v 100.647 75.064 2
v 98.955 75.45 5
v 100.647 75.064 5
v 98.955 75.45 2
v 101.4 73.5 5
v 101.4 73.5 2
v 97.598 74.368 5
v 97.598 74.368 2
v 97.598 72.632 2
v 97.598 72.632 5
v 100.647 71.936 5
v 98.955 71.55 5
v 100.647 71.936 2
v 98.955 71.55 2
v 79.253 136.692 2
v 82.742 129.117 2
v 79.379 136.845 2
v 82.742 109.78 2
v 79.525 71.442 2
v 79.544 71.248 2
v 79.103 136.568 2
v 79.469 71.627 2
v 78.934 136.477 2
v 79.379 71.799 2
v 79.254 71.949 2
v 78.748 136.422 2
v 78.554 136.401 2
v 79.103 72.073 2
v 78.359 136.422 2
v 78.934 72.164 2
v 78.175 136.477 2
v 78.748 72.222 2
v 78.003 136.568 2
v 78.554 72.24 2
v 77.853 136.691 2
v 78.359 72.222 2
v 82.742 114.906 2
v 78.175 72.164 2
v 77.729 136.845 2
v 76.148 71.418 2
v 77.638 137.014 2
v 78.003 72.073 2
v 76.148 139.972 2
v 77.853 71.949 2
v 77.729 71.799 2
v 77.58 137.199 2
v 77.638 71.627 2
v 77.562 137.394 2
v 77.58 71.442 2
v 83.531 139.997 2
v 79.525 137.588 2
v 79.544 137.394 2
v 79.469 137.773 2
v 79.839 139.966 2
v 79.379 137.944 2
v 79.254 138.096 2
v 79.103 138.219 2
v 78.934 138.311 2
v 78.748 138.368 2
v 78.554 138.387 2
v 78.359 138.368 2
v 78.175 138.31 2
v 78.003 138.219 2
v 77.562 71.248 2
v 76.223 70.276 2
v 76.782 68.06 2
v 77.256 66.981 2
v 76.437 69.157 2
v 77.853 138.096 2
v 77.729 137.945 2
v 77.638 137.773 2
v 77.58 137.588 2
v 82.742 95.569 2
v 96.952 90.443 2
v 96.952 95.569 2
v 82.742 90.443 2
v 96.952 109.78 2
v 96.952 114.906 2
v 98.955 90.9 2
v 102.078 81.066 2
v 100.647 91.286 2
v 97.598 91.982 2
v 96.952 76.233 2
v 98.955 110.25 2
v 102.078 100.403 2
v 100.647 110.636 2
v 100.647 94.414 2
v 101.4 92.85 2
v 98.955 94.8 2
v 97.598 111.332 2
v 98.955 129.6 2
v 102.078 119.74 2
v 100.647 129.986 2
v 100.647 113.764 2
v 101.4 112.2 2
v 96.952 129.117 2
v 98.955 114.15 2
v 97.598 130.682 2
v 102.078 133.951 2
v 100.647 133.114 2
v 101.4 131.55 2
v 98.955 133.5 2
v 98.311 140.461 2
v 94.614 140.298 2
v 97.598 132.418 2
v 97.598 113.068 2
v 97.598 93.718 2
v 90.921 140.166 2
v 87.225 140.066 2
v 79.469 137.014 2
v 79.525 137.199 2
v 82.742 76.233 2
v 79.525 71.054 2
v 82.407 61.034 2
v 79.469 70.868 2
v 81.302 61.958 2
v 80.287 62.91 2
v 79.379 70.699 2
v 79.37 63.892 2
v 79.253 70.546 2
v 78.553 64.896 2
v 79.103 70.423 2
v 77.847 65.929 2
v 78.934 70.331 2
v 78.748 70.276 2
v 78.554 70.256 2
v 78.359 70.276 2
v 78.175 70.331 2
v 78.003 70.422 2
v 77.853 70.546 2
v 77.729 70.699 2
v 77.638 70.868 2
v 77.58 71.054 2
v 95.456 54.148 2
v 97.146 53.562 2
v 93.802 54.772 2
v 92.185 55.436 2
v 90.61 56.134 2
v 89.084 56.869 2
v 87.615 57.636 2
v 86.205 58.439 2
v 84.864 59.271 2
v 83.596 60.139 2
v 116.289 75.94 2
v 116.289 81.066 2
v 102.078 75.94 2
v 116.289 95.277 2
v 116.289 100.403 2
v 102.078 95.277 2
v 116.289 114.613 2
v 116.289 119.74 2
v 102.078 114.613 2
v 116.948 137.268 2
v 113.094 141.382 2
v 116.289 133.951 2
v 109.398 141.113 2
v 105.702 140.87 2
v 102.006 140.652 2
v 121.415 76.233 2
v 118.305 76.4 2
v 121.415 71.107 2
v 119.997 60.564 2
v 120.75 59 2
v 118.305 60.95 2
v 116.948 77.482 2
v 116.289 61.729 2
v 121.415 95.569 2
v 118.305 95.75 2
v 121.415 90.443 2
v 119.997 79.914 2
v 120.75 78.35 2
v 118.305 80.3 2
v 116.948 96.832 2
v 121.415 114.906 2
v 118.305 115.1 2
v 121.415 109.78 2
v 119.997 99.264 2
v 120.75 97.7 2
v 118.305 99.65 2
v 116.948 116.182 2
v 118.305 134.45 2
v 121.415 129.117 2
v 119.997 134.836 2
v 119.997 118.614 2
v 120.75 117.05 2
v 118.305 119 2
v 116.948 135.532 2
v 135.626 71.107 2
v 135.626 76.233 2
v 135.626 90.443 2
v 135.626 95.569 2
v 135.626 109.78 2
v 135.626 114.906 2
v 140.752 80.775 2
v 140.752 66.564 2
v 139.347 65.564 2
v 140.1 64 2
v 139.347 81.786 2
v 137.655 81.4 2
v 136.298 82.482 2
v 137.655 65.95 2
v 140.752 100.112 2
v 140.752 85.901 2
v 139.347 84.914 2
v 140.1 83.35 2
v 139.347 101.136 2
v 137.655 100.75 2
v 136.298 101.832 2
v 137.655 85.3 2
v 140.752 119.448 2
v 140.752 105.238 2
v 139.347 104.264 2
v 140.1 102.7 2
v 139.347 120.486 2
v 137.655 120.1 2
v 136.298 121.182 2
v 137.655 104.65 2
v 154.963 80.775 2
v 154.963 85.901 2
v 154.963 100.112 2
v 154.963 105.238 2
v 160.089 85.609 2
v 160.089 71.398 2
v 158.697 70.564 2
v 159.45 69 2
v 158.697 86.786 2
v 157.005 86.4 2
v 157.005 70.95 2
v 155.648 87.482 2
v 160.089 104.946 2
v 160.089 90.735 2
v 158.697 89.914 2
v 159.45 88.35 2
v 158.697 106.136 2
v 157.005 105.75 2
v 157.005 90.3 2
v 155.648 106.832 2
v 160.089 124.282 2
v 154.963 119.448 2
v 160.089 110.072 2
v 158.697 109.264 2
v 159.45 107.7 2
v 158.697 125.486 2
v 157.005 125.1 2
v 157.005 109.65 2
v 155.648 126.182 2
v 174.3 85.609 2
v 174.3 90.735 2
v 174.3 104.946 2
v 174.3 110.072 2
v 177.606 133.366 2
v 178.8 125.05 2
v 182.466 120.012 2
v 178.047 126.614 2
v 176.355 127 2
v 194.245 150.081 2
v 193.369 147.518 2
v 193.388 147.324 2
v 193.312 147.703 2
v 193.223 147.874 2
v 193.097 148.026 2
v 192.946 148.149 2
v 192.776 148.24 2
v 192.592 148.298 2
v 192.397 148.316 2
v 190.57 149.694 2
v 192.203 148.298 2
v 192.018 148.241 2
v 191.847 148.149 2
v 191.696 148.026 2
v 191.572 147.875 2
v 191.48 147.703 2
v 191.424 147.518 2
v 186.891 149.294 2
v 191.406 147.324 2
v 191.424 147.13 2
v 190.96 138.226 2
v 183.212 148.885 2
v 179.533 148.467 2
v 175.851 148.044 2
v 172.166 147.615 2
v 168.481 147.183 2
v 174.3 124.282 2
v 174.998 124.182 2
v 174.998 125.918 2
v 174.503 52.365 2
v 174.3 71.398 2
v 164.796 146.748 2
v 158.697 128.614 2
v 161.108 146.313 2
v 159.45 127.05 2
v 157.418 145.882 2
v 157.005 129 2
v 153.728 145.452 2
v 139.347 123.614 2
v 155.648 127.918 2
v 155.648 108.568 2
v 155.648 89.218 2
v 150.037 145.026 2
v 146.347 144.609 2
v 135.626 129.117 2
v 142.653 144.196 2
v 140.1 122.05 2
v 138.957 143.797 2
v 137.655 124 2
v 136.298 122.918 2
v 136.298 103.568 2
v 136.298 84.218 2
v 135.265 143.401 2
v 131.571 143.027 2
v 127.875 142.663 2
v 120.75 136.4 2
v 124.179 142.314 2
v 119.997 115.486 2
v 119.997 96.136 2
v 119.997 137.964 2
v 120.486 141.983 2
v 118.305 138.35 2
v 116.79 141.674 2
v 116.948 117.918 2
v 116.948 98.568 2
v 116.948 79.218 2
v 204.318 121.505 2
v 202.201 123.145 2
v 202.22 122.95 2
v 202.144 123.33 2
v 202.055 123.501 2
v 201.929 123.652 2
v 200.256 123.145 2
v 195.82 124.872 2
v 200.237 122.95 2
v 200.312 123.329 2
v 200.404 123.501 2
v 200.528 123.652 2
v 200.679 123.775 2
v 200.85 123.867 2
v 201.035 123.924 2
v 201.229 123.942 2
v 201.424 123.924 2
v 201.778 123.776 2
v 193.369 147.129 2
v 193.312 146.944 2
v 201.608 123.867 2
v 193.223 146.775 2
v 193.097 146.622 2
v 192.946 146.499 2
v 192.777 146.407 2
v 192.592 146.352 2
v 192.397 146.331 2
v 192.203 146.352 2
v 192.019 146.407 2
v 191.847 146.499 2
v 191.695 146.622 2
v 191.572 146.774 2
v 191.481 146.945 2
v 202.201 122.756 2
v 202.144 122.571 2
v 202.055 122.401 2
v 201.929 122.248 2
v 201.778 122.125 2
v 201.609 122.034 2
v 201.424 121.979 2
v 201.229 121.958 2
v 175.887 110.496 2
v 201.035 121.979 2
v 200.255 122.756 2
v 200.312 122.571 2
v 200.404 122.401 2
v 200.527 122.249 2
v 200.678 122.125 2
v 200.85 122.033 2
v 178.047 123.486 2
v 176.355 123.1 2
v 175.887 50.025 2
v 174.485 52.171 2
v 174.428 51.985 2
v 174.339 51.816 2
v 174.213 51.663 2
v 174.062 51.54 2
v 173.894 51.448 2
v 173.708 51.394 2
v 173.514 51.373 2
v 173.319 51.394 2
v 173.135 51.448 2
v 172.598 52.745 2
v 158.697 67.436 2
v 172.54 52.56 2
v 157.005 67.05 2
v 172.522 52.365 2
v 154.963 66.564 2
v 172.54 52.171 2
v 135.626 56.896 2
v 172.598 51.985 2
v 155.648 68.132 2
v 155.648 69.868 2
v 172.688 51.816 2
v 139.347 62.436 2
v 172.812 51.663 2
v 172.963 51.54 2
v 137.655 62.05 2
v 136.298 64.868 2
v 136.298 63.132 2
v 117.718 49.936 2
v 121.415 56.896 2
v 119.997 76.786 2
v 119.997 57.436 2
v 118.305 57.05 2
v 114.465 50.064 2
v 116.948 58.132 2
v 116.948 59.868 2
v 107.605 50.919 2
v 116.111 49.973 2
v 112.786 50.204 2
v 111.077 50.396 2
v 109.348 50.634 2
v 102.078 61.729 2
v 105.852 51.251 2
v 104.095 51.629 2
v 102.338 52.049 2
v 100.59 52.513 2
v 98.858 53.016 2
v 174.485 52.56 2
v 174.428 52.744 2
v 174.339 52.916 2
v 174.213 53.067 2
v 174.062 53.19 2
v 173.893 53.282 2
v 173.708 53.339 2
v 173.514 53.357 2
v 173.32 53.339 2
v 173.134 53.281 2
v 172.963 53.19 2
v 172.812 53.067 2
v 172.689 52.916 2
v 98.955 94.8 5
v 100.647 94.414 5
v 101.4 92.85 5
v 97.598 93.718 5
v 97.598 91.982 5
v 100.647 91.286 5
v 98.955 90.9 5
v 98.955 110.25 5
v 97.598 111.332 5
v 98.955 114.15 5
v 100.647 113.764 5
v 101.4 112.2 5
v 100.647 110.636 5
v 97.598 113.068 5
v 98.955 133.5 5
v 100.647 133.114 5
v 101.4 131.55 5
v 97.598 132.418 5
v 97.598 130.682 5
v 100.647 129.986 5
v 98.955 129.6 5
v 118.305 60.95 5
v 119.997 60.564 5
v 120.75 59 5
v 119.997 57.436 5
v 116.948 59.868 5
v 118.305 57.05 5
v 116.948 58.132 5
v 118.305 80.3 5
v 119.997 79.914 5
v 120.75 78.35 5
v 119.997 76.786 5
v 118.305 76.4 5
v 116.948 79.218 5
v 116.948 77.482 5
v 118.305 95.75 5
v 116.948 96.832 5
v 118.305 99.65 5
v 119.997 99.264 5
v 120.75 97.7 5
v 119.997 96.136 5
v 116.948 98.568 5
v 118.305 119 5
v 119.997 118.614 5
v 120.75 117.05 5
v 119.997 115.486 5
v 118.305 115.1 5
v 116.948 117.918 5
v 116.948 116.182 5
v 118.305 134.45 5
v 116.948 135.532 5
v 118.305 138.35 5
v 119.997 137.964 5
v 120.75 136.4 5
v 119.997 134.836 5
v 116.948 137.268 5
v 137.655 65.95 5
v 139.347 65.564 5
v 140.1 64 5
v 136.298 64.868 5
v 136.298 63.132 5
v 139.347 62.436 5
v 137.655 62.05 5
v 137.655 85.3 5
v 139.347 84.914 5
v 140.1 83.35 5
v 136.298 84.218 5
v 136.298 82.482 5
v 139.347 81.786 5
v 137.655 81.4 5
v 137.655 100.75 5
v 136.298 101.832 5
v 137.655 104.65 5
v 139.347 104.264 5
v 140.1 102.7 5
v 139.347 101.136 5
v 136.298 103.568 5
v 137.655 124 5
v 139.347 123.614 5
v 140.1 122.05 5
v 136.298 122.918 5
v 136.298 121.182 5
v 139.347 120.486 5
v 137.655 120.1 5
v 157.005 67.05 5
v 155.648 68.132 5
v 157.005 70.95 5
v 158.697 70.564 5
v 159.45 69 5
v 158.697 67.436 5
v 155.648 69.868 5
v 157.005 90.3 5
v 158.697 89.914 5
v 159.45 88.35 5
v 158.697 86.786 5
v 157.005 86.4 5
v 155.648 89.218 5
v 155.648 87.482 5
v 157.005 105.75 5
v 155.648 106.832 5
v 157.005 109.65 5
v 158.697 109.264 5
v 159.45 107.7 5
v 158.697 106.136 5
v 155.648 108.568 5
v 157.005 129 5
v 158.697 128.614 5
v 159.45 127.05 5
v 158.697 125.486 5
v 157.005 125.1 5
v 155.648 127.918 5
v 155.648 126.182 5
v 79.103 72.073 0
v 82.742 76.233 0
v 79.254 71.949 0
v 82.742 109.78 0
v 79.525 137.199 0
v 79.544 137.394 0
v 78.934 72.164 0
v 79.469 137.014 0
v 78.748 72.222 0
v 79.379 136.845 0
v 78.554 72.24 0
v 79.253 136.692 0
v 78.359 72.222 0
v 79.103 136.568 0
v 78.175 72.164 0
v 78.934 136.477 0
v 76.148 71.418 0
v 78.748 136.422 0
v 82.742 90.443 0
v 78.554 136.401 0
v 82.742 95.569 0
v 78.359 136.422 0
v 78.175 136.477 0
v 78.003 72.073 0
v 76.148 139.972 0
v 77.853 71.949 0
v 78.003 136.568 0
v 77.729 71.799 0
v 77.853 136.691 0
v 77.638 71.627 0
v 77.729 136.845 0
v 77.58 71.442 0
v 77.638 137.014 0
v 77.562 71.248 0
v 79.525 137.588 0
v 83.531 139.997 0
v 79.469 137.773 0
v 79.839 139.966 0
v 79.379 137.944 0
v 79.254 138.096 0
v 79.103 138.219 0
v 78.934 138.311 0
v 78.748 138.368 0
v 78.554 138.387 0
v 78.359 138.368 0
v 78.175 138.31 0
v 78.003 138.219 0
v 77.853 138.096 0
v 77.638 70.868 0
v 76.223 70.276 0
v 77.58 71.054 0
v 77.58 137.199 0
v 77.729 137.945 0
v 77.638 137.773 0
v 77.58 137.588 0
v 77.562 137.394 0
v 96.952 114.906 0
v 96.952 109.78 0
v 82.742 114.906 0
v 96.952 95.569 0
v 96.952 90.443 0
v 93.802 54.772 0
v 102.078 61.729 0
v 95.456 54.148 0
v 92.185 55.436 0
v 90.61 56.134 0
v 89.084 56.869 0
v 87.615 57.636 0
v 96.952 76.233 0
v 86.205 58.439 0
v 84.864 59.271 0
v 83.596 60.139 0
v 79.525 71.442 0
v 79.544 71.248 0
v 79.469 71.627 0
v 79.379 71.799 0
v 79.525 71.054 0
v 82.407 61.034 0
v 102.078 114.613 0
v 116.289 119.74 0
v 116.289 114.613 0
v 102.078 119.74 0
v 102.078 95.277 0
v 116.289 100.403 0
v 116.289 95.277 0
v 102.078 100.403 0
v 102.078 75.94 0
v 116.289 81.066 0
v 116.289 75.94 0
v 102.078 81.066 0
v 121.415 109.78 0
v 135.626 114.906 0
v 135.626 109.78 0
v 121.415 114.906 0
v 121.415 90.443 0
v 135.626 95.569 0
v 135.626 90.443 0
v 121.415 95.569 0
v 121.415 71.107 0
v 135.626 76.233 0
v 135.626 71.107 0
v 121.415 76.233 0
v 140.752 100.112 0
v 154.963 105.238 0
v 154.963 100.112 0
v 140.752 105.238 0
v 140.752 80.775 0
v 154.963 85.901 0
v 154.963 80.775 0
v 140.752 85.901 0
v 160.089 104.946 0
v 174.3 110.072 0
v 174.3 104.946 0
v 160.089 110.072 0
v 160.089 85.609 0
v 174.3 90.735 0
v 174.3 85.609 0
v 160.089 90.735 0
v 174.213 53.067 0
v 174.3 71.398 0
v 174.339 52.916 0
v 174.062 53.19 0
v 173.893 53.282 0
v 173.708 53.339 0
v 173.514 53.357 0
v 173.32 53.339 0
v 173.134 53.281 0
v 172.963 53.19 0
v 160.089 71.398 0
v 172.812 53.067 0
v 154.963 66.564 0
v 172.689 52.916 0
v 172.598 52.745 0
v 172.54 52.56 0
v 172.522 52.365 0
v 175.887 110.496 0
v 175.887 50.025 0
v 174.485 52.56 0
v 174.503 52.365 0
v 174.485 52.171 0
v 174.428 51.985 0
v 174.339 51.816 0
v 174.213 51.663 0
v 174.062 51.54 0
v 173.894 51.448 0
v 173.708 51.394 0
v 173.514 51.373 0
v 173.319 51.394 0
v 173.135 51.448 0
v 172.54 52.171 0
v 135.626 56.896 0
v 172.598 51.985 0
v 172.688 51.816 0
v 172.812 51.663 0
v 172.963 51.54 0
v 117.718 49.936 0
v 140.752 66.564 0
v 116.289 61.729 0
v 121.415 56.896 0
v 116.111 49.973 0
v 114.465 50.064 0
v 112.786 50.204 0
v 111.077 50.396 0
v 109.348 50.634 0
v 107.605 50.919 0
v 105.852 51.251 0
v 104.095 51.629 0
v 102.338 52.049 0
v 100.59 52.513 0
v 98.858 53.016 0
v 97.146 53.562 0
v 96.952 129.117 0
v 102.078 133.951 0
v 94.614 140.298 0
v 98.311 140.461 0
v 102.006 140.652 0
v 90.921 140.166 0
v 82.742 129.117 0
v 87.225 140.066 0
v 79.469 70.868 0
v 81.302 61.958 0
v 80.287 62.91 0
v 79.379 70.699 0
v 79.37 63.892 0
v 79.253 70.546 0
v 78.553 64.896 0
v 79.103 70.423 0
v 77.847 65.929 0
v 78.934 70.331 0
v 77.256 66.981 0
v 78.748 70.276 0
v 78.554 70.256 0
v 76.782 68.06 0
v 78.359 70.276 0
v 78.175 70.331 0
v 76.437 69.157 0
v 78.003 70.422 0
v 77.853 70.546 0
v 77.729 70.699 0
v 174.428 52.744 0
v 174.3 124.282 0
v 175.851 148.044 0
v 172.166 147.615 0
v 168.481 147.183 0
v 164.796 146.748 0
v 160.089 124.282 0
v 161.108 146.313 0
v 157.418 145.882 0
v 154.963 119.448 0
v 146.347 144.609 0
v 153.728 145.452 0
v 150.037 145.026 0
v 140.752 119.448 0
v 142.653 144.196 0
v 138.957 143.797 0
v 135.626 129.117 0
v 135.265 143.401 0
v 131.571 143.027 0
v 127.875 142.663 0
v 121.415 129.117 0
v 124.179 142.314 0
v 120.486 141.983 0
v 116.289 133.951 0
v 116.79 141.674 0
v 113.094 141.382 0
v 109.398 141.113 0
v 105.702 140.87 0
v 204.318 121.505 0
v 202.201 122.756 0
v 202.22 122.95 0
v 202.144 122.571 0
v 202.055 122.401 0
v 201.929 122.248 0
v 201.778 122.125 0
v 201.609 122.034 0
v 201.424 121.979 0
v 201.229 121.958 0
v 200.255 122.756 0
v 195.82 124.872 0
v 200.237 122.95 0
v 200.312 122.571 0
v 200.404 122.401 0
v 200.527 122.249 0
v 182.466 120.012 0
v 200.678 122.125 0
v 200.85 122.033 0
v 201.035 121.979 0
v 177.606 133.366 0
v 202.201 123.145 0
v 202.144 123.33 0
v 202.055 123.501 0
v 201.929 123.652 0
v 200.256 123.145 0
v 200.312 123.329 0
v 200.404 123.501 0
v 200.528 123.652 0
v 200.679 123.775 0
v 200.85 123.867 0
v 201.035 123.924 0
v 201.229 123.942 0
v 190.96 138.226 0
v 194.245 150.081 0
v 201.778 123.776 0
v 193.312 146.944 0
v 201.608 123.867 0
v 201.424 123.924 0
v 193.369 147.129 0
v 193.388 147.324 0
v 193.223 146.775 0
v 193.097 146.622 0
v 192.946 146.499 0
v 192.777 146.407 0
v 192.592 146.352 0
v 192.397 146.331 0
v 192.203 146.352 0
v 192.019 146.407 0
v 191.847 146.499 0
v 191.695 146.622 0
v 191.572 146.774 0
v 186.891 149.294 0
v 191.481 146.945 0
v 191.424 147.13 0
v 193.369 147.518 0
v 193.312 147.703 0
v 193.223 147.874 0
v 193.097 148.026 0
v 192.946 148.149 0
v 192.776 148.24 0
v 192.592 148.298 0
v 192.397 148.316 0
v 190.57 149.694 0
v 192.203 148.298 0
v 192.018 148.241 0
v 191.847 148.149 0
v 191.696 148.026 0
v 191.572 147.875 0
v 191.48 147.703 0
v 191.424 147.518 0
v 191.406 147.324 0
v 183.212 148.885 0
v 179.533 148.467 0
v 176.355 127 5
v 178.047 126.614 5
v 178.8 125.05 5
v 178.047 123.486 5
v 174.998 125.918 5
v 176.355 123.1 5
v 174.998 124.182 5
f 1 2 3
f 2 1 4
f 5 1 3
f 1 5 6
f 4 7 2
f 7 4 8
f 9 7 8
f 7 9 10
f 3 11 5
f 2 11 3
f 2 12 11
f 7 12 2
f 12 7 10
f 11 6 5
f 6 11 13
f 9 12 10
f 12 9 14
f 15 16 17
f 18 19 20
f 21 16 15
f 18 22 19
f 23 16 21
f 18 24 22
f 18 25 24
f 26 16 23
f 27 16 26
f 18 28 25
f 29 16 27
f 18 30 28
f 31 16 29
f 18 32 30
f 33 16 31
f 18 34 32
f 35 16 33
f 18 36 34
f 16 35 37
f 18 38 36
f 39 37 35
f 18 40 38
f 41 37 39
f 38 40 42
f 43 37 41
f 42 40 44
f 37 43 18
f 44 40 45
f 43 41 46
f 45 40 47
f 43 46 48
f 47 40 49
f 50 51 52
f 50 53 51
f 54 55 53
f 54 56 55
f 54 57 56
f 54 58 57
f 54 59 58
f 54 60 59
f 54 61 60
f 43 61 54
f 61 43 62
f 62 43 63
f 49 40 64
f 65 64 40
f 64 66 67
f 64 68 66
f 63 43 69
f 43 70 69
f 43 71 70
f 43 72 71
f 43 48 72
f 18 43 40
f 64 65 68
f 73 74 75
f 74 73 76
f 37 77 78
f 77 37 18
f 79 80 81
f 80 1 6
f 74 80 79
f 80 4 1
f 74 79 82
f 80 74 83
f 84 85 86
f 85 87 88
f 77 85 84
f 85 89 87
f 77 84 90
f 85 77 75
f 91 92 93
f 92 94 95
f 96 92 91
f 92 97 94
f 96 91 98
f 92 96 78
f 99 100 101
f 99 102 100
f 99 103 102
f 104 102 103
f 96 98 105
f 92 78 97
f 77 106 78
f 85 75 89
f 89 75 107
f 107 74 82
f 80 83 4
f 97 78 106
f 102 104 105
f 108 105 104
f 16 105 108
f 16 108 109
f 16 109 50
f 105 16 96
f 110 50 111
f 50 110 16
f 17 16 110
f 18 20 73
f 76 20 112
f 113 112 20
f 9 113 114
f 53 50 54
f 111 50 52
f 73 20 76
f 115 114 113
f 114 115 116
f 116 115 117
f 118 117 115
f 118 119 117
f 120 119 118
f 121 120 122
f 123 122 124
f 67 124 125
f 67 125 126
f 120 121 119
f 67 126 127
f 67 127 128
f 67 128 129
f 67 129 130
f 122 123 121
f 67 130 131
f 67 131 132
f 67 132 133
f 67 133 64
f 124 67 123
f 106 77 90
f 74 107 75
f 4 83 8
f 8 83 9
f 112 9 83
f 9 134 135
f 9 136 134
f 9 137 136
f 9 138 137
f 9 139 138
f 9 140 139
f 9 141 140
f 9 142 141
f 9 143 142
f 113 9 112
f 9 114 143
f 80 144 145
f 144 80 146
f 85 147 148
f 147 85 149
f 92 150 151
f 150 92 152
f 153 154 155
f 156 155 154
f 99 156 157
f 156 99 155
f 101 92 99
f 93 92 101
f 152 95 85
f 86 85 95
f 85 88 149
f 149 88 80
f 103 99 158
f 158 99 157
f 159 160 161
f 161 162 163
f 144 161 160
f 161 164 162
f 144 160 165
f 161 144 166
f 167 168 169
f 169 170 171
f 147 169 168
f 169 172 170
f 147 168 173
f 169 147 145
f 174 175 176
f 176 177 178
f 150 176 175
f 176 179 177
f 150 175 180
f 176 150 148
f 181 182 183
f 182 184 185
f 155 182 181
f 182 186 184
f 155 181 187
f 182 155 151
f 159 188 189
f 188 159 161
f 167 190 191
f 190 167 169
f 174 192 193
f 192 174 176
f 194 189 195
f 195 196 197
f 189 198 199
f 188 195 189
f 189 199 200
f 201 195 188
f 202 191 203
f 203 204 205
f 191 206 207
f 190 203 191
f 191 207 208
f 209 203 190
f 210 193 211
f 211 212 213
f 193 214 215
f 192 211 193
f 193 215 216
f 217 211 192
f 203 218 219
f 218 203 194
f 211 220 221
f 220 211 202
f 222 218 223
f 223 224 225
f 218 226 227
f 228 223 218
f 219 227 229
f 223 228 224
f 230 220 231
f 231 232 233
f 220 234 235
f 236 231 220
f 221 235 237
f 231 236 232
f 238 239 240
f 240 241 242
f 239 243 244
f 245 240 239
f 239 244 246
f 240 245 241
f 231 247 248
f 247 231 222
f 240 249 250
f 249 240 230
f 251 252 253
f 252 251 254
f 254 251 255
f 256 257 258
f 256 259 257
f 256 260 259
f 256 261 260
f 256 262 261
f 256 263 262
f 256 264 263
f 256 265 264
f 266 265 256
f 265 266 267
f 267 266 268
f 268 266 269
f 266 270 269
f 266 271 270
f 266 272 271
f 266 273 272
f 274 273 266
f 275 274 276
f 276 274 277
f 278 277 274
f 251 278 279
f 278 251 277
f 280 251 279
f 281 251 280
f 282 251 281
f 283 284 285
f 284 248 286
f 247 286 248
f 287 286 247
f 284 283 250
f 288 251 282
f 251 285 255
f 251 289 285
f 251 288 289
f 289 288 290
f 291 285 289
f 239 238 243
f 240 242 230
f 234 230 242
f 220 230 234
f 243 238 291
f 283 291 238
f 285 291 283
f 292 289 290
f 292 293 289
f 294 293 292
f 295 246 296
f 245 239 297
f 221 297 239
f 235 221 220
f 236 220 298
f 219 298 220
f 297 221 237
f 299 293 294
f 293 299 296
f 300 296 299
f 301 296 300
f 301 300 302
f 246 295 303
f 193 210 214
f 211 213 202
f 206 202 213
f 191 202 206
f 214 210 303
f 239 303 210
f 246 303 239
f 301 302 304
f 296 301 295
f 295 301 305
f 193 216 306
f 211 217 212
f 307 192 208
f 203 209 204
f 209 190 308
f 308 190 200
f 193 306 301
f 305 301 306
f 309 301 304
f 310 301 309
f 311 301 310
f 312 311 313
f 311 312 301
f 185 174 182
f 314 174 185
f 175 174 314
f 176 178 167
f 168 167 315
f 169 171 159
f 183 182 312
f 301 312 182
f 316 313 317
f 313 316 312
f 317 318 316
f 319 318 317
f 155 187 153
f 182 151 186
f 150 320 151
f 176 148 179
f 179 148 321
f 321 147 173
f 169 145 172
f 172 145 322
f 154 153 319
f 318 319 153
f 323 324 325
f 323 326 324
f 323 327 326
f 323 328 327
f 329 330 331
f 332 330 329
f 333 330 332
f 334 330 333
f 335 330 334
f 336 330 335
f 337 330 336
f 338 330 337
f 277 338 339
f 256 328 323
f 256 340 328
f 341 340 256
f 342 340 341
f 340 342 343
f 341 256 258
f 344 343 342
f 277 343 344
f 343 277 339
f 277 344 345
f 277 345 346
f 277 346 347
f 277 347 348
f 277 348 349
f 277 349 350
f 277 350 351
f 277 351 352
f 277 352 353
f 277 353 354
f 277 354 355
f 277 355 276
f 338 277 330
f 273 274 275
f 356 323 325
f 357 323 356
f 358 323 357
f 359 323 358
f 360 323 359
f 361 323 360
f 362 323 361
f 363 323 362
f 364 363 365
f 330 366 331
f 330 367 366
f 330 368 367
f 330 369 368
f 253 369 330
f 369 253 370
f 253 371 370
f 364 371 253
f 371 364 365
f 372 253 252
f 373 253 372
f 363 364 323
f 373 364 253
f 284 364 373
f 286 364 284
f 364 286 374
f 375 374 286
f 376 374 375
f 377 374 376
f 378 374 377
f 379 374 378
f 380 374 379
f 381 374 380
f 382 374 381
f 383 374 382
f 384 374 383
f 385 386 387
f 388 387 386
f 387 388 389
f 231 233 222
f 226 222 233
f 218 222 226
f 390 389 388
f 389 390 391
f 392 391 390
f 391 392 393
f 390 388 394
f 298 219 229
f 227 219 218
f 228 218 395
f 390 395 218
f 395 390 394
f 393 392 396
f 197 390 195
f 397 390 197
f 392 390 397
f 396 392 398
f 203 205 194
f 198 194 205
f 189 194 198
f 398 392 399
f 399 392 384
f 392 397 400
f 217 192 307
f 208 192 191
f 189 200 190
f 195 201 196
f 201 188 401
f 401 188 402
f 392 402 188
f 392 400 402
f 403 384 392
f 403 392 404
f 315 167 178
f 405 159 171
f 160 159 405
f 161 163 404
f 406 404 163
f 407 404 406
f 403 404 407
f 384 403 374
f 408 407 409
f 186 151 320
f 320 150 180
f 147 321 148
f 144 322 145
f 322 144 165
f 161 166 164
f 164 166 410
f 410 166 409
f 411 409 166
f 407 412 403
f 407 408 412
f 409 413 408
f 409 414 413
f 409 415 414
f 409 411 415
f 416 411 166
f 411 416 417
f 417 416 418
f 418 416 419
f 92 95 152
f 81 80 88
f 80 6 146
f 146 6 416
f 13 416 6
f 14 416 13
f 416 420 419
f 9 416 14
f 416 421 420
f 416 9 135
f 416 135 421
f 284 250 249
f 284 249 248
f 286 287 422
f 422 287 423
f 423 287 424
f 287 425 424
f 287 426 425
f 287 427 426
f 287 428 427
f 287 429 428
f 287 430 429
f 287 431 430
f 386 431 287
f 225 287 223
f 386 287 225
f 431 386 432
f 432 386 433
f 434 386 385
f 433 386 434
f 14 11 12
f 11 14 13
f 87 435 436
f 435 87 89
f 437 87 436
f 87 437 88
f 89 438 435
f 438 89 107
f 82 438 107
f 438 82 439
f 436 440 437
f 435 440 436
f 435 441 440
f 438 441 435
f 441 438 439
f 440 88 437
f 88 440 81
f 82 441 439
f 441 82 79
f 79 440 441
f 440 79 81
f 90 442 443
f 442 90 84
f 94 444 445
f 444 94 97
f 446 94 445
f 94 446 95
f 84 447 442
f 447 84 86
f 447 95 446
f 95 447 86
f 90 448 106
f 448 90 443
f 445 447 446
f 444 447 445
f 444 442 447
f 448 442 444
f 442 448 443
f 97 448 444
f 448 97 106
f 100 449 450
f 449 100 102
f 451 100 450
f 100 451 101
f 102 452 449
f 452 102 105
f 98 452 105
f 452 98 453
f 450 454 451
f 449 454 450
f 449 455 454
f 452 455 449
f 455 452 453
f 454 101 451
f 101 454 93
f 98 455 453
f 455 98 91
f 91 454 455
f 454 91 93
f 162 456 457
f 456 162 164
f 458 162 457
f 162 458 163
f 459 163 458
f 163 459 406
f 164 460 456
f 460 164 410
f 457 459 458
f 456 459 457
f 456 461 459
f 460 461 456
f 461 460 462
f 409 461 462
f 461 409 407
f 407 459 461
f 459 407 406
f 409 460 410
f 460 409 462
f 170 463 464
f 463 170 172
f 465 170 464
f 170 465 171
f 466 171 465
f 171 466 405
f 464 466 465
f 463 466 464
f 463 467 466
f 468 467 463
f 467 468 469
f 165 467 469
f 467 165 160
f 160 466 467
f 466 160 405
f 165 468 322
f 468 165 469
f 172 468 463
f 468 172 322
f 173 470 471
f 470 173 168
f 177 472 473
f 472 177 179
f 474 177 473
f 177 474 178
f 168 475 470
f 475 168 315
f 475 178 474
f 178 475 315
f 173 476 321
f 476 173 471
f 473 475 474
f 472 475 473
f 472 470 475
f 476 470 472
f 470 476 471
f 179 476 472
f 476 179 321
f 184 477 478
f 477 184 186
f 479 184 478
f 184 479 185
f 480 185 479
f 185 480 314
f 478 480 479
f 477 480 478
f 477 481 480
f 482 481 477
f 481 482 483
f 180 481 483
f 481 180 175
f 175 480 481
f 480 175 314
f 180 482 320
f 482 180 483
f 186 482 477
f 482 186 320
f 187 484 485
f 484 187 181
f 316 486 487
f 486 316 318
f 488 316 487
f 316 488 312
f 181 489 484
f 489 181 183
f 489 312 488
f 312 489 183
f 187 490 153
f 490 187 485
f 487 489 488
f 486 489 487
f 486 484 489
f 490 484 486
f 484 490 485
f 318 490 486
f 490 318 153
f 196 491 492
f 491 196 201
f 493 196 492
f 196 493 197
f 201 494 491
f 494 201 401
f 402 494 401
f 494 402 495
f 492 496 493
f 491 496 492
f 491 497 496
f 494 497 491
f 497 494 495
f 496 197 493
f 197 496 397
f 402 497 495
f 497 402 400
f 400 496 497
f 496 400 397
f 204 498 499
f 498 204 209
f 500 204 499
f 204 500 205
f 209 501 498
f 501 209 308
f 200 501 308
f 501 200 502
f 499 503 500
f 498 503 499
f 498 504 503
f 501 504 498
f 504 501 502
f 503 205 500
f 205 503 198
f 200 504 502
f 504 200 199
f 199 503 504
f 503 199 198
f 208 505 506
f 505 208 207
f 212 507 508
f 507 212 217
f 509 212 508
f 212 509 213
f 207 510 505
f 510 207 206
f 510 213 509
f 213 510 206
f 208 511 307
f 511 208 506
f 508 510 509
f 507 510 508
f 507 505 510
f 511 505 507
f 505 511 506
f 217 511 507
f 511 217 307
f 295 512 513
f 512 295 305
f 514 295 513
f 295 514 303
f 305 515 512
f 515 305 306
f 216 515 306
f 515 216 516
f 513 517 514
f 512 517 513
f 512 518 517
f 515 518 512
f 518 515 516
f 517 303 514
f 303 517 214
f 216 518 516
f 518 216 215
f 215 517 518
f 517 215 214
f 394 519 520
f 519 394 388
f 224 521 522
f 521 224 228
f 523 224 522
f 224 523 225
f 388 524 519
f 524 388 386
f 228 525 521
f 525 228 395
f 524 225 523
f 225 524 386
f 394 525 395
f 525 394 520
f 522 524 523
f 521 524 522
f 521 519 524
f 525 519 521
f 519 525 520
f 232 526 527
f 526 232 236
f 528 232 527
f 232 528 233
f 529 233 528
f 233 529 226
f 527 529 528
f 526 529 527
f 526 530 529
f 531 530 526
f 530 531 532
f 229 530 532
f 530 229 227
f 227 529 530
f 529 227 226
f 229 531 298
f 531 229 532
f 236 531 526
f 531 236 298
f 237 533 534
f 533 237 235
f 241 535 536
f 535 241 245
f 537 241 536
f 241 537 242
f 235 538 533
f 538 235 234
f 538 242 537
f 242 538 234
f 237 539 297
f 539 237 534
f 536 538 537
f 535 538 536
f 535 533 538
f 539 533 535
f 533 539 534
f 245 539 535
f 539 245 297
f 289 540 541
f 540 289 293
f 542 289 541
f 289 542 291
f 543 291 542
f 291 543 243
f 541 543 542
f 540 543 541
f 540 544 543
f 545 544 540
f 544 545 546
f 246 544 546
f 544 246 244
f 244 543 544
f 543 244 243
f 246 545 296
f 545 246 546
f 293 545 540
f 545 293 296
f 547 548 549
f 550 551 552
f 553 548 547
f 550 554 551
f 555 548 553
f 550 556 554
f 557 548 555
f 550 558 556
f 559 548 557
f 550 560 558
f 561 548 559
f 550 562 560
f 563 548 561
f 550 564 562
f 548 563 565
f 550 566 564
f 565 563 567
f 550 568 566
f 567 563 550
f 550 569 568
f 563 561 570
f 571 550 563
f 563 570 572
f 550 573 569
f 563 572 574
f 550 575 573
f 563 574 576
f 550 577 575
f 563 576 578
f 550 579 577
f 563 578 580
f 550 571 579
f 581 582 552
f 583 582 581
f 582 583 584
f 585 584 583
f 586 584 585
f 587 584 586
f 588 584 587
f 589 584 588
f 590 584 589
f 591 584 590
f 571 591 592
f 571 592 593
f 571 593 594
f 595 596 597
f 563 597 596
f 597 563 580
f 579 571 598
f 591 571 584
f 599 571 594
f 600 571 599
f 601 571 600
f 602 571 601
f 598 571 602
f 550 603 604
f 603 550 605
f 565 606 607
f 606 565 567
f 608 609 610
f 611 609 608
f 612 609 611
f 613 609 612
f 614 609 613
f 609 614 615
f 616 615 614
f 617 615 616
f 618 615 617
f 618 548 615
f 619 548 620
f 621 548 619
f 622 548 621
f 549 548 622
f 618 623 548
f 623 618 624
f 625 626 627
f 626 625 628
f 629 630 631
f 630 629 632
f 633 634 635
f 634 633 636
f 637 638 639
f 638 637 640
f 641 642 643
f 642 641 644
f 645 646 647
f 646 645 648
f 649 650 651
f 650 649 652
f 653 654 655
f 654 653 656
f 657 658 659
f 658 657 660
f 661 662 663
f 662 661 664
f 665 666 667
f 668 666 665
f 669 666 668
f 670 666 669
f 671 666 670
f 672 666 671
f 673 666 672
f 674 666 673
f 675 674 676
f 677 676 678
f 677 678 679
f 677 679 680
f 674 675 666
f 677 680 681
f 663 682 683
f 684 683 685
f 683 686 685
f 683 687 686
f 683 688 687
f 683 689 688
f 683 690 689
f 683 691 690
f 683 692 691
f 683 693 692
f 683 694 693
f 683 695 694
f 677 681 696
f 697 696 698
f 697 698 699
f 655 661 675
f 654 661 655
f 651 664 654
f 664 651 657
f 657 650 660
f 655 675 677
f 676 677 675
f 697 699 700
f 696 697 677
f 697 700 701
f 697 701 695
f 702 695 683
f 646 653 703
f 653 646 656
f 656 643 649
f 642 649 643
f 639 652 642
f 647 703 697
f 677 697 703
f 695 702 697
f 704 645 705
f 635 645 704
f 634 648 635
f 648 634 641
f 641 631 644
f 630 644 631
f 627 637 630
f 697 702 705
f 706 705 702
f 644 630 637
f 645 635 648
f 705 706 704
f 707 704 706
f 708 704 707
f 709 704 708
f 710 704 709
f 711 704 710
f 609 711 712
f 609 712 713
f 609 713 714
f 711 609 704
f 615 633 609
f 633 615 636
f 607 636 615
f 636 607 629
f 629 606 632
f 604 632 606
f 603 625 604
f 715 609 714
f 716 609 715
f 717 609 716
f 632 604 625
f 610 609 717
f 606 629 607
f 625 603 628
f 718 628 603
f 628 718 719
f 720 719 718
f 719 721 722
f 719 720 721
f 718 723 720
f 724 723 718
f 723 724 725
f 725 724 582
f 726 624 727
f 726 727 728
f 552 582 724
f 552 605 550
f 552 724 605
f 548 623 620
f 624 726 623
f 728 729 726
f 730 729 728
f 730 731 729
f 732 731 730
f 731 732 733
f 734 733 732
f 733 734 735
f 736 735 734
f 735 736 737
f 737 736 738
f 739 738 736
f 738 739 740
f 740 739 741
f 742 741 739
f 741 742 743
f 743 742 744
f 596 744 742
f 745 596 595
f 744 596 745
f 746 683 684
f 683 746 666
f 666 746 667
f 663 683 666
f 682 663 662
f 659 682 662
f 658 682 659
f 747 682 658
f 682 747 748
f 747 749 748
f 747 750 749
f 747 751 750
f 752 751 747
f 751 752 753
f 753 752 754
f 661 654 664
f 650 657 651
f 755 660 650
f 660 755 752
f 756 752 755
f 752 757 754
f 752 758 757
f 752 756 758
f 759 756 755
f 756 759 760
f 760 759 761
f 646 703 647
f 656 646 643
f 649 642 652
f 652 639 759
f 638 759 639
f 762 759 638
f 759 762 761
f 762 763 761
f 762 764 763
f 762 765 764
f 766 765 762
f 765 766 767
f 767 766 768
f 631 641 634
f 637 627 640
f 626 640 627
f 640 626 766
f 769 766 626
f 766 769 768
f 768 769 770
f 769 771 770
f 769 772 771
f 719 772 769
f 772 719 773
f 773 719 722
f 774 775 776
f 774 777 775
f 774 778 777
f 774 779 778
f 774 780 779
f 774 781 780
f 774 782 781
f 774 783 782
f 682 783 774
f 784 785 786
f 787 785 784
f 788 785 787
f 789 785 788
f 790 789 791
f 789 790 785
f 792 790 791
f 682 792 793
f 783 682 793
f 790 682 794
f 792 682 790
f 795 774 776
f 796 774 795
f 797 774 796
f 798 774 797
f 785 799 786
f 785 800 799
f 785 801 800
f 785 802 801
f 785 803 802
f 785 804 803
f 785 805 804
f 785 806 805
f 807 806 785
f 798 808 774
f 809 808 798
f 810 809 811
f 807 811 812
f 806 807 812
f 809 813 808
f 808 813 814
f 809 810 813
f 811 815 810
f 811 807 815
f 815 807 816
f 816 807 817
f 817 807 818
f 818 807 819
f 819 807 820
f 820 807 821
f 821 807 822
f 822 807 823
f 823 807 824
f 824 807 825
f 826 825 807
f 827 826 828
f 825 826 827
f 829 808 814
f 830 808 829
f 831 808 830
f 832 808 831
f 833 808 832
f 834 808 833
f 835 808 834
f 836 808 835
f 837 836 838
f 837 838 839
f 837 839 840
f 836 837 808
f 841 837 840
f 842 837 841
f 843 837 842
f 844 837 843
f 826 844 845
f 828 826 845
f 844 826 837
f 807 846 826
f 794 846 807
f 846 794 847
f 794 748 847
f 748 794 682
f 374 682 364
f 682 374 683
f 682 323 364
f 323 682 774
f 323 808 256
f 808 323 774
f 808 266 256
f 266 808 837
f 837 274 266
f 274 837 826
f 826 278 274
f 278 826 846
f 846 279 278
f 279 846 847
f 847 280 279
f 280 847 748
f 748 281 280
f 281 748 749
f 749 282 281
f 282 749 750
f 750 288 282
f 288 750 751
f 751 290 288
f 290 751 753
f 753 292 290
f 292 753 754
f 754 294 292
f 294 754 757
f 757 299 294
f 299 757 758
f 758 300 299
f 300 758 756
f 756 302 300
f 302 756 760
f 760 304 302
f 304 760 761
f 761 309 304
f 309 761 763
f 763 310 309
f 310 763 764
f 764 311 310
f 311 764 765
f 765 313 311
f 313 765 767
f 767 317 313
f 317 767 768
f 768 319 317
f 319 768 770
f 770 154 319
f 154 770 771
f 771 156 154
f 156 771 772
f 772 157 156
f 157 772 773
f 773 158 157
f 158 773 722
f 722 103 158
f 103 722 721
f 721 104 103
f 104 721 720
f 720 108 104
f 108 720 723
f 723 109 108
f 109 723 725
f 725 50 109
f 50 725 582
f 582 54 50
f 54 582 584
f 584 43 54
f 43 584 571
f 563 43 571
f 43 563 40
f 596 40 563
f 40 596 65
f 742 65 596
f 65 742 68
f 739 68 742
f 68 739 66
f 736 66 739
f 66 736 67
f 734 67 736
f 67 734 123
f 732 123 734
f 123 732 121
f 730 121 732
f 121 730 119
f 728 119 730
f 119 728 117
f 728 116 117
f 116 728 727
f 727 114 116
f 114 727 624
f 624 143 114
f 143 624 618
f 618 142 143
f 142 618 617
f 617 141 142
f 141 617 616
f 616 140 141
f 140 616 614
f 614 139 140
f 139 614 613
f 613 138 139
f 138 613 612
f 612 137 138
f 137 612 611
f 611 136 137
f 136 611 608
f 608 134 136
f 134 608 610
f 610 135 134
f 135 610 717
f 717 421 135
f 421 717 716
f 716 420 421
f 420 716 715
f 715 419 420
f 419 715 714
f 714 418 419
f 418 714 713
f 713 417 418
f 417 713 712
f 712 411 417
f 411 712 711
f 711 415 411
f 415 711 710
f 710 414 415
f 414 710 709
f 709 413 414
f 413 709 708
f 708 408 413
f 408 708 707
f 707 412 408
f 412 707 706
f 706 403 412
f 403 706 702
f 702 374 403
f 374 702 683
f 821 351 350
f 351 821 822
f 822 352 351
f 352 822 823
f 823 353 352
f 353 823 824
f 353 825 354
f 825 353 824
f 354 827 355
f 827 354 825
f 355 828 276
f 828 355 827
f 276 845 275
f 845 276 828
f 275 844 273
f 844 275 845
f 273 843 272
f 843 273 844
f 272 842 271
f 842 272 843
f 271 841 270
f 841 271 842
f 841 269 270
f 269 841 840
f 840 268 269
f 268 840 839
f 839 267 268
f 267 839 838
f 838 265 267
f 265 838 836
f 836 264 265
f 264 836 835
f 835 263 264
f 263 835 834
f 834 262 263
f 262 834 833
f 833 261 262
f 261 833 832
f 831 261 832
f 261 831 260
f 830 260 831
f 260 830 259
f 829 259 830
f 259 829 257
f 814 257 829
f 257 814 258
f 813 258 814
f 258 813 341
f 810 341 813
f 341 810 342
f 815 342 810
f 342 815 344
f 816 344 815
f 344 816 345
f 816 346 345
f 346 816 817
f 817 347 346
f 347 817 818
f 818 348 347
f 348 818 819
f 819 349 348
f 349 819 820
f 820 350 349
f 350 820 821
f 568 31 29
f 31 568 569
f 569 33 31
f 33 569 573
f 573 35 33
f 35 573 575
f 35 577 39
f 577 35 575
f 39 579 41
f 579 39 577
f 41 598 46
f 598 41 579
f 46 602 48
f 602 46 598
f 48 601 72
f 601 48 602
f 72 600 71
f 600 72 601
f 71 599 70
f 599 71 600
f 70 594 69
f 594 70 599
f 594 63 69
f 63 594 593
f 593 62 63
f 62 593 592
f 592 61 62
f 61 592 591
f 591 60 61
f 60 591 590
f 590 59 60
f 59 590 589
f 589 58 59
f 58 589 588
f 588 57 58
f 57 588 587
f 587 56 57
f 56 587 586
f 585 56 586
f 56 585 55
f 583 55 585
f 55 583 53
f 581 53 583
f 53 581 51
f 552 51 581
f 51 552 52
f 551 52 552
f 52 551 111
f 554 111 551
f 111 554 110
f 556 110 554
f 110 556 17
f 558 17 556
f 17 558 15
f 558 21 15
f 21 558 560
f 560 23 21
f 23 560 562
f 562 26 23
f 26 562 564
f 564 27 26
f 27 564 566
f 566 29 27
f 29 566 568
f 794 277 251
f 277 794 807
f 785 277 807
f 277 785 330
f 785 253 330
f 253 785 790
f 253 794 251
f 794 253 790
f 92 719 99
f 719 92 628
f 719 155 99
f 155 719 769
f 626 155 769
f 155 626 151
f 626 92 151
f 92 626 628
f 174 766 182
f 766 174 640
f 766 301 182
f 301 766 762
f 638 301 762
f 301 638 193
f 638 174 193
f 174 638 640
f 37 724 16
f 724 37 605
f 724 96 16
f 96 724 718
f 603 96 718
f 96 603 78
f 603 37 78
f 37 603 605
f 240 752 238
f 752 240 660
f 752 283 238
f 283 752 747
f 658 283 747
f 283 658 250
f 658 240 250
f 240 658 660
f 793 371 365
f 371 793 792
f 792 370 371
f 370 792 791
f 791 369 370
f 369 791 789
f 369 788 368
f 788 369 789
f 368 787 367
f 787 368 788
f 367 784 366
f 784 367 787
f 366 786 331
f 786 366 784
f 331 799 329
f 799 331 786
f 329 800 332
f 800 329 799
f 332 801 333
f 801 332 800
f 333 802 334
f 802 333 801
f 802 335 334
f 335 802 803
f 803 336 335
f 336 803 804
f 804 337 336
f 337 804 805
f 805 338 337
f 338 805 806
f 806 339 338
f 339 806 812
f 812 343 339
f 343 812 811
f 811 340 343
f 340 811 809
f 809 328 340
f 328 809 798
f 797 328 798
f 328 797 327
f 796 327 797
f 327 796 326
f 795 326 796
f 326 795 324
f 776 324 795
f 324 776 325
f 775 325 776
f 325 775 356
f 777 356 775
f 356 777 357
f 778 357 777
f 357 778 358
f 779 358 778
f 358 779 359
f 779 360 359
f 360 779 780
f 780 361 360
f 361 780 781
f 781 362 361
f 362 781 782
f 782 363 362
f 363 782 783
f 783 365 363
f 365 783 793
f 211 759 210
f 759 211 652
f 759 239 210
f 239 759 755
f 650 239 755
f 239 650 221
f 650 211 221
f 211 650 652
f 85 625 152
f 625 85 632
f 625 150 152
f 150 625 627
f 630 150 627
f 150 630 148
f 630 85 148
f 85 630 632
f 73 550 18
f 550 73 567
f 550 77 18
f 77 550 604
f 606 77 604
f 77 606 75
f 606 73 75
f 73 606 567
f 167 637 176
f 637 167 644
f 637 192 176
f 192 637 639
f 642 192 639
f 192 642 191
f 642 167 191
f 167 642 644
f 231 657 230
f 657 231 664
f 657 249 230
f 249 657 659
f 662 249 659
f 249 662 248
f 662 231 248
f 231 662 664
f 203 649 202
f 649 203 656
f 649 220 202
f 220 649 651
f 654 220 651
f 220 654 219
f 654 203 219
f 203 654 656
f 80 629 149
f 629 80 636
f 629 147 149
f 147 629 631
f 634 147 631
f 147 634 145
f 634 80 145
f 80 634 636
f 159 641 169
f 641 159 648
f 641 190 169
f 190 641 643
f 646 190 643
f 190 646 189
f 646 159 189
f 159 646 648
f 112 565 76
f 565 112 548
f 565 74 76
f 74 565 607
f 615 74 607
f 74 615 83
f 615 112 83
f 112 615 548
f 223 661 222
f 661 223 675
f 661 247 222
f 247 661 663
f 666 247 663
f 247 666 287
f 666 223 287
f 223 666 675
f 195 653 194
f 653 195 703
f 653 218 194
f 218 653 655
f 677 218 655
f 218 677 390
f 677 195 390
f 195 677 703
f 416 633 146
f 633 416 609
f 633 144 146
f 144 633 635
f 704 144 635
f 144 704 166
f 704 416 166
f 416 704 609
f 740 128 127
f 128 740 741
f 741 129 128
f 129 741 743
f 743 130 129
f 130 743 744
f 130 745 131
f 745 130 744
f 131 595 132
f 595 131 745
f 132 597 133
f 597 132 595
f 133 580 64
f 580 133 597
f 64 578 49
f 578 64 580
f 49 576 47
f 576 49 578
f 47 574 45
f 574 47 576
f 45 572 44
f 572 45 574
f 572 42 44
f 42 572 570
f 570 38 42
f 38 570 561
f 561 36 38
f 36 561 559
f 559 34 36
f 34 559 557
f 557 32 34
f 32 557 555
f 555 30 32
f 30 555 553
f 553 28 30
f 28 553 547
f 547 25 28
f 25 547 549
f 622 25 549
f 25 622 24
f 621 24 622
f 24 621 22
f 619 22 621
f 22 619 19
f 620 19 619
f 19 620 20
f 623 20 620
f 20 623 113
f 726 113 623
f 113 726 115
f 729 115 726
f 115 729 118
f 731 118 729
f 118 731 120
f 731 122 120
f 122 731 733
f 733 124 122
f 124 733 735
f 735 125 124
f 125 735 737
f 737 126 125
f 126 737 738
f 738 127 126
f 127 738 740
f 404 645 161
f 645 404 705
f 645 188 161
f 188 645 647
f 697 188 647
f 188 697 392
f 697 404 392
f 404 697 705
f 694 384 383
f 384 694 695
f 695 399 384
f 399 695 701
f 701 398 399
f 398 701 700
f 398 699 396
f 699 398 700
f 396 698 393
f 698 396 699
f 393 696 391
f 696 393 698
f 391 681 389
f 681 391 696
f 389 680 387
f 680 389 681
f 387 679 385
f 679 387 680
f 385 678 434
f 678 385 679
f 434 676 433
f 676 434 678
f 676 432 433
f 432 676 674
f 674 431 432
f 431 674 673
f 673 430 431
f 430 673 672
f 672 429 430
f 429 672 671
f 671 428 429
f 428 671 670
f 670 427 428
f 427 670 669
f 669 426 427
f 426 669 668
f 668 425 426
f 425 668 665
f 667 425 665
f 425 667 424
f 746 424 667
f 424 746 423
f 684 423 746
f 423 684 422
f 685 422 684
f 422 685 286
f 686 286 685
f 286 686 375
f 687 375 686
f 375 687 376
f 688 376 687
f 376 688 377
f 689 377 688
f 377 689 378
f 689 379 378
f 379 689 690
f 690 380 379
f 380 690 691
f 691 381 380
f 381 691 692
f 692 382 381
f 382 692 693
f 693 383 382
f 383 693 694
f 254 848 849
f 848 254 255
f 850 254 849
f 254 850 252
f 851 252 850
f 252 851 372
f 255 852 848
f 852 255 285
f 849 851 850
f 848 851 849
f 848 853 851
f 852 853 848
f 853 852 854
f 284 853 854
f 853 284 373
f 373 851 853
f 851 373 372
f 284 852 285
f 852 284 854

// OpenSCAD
translate([0,0,0]) linear_extrude(file="./top-plate.dxf", height=2);
mx_size = 19.35;

for (i=[0:3]) {
    translate([99.4,73.5+i*mx_size,2]) cylinder(3,2,2);
}
for (i=[0:4]) {
    translate([99.4+mx_size,59+i*mx_size,2]) cylinder(3,2,2);
}
for (i=[0:3]) {
    translate([99.4+mx_size*2,64+i*mx_size,2]) cylinder(3,2,2);
}
for (i=[0:3]) {
    translate([99.4+mx_size*3,69+i*mx_size,2]) cylinder(3,2,2);
}
translate([99.4+mx_size*4,67+3*mx_size,2]) cylinder(3,2,2);
